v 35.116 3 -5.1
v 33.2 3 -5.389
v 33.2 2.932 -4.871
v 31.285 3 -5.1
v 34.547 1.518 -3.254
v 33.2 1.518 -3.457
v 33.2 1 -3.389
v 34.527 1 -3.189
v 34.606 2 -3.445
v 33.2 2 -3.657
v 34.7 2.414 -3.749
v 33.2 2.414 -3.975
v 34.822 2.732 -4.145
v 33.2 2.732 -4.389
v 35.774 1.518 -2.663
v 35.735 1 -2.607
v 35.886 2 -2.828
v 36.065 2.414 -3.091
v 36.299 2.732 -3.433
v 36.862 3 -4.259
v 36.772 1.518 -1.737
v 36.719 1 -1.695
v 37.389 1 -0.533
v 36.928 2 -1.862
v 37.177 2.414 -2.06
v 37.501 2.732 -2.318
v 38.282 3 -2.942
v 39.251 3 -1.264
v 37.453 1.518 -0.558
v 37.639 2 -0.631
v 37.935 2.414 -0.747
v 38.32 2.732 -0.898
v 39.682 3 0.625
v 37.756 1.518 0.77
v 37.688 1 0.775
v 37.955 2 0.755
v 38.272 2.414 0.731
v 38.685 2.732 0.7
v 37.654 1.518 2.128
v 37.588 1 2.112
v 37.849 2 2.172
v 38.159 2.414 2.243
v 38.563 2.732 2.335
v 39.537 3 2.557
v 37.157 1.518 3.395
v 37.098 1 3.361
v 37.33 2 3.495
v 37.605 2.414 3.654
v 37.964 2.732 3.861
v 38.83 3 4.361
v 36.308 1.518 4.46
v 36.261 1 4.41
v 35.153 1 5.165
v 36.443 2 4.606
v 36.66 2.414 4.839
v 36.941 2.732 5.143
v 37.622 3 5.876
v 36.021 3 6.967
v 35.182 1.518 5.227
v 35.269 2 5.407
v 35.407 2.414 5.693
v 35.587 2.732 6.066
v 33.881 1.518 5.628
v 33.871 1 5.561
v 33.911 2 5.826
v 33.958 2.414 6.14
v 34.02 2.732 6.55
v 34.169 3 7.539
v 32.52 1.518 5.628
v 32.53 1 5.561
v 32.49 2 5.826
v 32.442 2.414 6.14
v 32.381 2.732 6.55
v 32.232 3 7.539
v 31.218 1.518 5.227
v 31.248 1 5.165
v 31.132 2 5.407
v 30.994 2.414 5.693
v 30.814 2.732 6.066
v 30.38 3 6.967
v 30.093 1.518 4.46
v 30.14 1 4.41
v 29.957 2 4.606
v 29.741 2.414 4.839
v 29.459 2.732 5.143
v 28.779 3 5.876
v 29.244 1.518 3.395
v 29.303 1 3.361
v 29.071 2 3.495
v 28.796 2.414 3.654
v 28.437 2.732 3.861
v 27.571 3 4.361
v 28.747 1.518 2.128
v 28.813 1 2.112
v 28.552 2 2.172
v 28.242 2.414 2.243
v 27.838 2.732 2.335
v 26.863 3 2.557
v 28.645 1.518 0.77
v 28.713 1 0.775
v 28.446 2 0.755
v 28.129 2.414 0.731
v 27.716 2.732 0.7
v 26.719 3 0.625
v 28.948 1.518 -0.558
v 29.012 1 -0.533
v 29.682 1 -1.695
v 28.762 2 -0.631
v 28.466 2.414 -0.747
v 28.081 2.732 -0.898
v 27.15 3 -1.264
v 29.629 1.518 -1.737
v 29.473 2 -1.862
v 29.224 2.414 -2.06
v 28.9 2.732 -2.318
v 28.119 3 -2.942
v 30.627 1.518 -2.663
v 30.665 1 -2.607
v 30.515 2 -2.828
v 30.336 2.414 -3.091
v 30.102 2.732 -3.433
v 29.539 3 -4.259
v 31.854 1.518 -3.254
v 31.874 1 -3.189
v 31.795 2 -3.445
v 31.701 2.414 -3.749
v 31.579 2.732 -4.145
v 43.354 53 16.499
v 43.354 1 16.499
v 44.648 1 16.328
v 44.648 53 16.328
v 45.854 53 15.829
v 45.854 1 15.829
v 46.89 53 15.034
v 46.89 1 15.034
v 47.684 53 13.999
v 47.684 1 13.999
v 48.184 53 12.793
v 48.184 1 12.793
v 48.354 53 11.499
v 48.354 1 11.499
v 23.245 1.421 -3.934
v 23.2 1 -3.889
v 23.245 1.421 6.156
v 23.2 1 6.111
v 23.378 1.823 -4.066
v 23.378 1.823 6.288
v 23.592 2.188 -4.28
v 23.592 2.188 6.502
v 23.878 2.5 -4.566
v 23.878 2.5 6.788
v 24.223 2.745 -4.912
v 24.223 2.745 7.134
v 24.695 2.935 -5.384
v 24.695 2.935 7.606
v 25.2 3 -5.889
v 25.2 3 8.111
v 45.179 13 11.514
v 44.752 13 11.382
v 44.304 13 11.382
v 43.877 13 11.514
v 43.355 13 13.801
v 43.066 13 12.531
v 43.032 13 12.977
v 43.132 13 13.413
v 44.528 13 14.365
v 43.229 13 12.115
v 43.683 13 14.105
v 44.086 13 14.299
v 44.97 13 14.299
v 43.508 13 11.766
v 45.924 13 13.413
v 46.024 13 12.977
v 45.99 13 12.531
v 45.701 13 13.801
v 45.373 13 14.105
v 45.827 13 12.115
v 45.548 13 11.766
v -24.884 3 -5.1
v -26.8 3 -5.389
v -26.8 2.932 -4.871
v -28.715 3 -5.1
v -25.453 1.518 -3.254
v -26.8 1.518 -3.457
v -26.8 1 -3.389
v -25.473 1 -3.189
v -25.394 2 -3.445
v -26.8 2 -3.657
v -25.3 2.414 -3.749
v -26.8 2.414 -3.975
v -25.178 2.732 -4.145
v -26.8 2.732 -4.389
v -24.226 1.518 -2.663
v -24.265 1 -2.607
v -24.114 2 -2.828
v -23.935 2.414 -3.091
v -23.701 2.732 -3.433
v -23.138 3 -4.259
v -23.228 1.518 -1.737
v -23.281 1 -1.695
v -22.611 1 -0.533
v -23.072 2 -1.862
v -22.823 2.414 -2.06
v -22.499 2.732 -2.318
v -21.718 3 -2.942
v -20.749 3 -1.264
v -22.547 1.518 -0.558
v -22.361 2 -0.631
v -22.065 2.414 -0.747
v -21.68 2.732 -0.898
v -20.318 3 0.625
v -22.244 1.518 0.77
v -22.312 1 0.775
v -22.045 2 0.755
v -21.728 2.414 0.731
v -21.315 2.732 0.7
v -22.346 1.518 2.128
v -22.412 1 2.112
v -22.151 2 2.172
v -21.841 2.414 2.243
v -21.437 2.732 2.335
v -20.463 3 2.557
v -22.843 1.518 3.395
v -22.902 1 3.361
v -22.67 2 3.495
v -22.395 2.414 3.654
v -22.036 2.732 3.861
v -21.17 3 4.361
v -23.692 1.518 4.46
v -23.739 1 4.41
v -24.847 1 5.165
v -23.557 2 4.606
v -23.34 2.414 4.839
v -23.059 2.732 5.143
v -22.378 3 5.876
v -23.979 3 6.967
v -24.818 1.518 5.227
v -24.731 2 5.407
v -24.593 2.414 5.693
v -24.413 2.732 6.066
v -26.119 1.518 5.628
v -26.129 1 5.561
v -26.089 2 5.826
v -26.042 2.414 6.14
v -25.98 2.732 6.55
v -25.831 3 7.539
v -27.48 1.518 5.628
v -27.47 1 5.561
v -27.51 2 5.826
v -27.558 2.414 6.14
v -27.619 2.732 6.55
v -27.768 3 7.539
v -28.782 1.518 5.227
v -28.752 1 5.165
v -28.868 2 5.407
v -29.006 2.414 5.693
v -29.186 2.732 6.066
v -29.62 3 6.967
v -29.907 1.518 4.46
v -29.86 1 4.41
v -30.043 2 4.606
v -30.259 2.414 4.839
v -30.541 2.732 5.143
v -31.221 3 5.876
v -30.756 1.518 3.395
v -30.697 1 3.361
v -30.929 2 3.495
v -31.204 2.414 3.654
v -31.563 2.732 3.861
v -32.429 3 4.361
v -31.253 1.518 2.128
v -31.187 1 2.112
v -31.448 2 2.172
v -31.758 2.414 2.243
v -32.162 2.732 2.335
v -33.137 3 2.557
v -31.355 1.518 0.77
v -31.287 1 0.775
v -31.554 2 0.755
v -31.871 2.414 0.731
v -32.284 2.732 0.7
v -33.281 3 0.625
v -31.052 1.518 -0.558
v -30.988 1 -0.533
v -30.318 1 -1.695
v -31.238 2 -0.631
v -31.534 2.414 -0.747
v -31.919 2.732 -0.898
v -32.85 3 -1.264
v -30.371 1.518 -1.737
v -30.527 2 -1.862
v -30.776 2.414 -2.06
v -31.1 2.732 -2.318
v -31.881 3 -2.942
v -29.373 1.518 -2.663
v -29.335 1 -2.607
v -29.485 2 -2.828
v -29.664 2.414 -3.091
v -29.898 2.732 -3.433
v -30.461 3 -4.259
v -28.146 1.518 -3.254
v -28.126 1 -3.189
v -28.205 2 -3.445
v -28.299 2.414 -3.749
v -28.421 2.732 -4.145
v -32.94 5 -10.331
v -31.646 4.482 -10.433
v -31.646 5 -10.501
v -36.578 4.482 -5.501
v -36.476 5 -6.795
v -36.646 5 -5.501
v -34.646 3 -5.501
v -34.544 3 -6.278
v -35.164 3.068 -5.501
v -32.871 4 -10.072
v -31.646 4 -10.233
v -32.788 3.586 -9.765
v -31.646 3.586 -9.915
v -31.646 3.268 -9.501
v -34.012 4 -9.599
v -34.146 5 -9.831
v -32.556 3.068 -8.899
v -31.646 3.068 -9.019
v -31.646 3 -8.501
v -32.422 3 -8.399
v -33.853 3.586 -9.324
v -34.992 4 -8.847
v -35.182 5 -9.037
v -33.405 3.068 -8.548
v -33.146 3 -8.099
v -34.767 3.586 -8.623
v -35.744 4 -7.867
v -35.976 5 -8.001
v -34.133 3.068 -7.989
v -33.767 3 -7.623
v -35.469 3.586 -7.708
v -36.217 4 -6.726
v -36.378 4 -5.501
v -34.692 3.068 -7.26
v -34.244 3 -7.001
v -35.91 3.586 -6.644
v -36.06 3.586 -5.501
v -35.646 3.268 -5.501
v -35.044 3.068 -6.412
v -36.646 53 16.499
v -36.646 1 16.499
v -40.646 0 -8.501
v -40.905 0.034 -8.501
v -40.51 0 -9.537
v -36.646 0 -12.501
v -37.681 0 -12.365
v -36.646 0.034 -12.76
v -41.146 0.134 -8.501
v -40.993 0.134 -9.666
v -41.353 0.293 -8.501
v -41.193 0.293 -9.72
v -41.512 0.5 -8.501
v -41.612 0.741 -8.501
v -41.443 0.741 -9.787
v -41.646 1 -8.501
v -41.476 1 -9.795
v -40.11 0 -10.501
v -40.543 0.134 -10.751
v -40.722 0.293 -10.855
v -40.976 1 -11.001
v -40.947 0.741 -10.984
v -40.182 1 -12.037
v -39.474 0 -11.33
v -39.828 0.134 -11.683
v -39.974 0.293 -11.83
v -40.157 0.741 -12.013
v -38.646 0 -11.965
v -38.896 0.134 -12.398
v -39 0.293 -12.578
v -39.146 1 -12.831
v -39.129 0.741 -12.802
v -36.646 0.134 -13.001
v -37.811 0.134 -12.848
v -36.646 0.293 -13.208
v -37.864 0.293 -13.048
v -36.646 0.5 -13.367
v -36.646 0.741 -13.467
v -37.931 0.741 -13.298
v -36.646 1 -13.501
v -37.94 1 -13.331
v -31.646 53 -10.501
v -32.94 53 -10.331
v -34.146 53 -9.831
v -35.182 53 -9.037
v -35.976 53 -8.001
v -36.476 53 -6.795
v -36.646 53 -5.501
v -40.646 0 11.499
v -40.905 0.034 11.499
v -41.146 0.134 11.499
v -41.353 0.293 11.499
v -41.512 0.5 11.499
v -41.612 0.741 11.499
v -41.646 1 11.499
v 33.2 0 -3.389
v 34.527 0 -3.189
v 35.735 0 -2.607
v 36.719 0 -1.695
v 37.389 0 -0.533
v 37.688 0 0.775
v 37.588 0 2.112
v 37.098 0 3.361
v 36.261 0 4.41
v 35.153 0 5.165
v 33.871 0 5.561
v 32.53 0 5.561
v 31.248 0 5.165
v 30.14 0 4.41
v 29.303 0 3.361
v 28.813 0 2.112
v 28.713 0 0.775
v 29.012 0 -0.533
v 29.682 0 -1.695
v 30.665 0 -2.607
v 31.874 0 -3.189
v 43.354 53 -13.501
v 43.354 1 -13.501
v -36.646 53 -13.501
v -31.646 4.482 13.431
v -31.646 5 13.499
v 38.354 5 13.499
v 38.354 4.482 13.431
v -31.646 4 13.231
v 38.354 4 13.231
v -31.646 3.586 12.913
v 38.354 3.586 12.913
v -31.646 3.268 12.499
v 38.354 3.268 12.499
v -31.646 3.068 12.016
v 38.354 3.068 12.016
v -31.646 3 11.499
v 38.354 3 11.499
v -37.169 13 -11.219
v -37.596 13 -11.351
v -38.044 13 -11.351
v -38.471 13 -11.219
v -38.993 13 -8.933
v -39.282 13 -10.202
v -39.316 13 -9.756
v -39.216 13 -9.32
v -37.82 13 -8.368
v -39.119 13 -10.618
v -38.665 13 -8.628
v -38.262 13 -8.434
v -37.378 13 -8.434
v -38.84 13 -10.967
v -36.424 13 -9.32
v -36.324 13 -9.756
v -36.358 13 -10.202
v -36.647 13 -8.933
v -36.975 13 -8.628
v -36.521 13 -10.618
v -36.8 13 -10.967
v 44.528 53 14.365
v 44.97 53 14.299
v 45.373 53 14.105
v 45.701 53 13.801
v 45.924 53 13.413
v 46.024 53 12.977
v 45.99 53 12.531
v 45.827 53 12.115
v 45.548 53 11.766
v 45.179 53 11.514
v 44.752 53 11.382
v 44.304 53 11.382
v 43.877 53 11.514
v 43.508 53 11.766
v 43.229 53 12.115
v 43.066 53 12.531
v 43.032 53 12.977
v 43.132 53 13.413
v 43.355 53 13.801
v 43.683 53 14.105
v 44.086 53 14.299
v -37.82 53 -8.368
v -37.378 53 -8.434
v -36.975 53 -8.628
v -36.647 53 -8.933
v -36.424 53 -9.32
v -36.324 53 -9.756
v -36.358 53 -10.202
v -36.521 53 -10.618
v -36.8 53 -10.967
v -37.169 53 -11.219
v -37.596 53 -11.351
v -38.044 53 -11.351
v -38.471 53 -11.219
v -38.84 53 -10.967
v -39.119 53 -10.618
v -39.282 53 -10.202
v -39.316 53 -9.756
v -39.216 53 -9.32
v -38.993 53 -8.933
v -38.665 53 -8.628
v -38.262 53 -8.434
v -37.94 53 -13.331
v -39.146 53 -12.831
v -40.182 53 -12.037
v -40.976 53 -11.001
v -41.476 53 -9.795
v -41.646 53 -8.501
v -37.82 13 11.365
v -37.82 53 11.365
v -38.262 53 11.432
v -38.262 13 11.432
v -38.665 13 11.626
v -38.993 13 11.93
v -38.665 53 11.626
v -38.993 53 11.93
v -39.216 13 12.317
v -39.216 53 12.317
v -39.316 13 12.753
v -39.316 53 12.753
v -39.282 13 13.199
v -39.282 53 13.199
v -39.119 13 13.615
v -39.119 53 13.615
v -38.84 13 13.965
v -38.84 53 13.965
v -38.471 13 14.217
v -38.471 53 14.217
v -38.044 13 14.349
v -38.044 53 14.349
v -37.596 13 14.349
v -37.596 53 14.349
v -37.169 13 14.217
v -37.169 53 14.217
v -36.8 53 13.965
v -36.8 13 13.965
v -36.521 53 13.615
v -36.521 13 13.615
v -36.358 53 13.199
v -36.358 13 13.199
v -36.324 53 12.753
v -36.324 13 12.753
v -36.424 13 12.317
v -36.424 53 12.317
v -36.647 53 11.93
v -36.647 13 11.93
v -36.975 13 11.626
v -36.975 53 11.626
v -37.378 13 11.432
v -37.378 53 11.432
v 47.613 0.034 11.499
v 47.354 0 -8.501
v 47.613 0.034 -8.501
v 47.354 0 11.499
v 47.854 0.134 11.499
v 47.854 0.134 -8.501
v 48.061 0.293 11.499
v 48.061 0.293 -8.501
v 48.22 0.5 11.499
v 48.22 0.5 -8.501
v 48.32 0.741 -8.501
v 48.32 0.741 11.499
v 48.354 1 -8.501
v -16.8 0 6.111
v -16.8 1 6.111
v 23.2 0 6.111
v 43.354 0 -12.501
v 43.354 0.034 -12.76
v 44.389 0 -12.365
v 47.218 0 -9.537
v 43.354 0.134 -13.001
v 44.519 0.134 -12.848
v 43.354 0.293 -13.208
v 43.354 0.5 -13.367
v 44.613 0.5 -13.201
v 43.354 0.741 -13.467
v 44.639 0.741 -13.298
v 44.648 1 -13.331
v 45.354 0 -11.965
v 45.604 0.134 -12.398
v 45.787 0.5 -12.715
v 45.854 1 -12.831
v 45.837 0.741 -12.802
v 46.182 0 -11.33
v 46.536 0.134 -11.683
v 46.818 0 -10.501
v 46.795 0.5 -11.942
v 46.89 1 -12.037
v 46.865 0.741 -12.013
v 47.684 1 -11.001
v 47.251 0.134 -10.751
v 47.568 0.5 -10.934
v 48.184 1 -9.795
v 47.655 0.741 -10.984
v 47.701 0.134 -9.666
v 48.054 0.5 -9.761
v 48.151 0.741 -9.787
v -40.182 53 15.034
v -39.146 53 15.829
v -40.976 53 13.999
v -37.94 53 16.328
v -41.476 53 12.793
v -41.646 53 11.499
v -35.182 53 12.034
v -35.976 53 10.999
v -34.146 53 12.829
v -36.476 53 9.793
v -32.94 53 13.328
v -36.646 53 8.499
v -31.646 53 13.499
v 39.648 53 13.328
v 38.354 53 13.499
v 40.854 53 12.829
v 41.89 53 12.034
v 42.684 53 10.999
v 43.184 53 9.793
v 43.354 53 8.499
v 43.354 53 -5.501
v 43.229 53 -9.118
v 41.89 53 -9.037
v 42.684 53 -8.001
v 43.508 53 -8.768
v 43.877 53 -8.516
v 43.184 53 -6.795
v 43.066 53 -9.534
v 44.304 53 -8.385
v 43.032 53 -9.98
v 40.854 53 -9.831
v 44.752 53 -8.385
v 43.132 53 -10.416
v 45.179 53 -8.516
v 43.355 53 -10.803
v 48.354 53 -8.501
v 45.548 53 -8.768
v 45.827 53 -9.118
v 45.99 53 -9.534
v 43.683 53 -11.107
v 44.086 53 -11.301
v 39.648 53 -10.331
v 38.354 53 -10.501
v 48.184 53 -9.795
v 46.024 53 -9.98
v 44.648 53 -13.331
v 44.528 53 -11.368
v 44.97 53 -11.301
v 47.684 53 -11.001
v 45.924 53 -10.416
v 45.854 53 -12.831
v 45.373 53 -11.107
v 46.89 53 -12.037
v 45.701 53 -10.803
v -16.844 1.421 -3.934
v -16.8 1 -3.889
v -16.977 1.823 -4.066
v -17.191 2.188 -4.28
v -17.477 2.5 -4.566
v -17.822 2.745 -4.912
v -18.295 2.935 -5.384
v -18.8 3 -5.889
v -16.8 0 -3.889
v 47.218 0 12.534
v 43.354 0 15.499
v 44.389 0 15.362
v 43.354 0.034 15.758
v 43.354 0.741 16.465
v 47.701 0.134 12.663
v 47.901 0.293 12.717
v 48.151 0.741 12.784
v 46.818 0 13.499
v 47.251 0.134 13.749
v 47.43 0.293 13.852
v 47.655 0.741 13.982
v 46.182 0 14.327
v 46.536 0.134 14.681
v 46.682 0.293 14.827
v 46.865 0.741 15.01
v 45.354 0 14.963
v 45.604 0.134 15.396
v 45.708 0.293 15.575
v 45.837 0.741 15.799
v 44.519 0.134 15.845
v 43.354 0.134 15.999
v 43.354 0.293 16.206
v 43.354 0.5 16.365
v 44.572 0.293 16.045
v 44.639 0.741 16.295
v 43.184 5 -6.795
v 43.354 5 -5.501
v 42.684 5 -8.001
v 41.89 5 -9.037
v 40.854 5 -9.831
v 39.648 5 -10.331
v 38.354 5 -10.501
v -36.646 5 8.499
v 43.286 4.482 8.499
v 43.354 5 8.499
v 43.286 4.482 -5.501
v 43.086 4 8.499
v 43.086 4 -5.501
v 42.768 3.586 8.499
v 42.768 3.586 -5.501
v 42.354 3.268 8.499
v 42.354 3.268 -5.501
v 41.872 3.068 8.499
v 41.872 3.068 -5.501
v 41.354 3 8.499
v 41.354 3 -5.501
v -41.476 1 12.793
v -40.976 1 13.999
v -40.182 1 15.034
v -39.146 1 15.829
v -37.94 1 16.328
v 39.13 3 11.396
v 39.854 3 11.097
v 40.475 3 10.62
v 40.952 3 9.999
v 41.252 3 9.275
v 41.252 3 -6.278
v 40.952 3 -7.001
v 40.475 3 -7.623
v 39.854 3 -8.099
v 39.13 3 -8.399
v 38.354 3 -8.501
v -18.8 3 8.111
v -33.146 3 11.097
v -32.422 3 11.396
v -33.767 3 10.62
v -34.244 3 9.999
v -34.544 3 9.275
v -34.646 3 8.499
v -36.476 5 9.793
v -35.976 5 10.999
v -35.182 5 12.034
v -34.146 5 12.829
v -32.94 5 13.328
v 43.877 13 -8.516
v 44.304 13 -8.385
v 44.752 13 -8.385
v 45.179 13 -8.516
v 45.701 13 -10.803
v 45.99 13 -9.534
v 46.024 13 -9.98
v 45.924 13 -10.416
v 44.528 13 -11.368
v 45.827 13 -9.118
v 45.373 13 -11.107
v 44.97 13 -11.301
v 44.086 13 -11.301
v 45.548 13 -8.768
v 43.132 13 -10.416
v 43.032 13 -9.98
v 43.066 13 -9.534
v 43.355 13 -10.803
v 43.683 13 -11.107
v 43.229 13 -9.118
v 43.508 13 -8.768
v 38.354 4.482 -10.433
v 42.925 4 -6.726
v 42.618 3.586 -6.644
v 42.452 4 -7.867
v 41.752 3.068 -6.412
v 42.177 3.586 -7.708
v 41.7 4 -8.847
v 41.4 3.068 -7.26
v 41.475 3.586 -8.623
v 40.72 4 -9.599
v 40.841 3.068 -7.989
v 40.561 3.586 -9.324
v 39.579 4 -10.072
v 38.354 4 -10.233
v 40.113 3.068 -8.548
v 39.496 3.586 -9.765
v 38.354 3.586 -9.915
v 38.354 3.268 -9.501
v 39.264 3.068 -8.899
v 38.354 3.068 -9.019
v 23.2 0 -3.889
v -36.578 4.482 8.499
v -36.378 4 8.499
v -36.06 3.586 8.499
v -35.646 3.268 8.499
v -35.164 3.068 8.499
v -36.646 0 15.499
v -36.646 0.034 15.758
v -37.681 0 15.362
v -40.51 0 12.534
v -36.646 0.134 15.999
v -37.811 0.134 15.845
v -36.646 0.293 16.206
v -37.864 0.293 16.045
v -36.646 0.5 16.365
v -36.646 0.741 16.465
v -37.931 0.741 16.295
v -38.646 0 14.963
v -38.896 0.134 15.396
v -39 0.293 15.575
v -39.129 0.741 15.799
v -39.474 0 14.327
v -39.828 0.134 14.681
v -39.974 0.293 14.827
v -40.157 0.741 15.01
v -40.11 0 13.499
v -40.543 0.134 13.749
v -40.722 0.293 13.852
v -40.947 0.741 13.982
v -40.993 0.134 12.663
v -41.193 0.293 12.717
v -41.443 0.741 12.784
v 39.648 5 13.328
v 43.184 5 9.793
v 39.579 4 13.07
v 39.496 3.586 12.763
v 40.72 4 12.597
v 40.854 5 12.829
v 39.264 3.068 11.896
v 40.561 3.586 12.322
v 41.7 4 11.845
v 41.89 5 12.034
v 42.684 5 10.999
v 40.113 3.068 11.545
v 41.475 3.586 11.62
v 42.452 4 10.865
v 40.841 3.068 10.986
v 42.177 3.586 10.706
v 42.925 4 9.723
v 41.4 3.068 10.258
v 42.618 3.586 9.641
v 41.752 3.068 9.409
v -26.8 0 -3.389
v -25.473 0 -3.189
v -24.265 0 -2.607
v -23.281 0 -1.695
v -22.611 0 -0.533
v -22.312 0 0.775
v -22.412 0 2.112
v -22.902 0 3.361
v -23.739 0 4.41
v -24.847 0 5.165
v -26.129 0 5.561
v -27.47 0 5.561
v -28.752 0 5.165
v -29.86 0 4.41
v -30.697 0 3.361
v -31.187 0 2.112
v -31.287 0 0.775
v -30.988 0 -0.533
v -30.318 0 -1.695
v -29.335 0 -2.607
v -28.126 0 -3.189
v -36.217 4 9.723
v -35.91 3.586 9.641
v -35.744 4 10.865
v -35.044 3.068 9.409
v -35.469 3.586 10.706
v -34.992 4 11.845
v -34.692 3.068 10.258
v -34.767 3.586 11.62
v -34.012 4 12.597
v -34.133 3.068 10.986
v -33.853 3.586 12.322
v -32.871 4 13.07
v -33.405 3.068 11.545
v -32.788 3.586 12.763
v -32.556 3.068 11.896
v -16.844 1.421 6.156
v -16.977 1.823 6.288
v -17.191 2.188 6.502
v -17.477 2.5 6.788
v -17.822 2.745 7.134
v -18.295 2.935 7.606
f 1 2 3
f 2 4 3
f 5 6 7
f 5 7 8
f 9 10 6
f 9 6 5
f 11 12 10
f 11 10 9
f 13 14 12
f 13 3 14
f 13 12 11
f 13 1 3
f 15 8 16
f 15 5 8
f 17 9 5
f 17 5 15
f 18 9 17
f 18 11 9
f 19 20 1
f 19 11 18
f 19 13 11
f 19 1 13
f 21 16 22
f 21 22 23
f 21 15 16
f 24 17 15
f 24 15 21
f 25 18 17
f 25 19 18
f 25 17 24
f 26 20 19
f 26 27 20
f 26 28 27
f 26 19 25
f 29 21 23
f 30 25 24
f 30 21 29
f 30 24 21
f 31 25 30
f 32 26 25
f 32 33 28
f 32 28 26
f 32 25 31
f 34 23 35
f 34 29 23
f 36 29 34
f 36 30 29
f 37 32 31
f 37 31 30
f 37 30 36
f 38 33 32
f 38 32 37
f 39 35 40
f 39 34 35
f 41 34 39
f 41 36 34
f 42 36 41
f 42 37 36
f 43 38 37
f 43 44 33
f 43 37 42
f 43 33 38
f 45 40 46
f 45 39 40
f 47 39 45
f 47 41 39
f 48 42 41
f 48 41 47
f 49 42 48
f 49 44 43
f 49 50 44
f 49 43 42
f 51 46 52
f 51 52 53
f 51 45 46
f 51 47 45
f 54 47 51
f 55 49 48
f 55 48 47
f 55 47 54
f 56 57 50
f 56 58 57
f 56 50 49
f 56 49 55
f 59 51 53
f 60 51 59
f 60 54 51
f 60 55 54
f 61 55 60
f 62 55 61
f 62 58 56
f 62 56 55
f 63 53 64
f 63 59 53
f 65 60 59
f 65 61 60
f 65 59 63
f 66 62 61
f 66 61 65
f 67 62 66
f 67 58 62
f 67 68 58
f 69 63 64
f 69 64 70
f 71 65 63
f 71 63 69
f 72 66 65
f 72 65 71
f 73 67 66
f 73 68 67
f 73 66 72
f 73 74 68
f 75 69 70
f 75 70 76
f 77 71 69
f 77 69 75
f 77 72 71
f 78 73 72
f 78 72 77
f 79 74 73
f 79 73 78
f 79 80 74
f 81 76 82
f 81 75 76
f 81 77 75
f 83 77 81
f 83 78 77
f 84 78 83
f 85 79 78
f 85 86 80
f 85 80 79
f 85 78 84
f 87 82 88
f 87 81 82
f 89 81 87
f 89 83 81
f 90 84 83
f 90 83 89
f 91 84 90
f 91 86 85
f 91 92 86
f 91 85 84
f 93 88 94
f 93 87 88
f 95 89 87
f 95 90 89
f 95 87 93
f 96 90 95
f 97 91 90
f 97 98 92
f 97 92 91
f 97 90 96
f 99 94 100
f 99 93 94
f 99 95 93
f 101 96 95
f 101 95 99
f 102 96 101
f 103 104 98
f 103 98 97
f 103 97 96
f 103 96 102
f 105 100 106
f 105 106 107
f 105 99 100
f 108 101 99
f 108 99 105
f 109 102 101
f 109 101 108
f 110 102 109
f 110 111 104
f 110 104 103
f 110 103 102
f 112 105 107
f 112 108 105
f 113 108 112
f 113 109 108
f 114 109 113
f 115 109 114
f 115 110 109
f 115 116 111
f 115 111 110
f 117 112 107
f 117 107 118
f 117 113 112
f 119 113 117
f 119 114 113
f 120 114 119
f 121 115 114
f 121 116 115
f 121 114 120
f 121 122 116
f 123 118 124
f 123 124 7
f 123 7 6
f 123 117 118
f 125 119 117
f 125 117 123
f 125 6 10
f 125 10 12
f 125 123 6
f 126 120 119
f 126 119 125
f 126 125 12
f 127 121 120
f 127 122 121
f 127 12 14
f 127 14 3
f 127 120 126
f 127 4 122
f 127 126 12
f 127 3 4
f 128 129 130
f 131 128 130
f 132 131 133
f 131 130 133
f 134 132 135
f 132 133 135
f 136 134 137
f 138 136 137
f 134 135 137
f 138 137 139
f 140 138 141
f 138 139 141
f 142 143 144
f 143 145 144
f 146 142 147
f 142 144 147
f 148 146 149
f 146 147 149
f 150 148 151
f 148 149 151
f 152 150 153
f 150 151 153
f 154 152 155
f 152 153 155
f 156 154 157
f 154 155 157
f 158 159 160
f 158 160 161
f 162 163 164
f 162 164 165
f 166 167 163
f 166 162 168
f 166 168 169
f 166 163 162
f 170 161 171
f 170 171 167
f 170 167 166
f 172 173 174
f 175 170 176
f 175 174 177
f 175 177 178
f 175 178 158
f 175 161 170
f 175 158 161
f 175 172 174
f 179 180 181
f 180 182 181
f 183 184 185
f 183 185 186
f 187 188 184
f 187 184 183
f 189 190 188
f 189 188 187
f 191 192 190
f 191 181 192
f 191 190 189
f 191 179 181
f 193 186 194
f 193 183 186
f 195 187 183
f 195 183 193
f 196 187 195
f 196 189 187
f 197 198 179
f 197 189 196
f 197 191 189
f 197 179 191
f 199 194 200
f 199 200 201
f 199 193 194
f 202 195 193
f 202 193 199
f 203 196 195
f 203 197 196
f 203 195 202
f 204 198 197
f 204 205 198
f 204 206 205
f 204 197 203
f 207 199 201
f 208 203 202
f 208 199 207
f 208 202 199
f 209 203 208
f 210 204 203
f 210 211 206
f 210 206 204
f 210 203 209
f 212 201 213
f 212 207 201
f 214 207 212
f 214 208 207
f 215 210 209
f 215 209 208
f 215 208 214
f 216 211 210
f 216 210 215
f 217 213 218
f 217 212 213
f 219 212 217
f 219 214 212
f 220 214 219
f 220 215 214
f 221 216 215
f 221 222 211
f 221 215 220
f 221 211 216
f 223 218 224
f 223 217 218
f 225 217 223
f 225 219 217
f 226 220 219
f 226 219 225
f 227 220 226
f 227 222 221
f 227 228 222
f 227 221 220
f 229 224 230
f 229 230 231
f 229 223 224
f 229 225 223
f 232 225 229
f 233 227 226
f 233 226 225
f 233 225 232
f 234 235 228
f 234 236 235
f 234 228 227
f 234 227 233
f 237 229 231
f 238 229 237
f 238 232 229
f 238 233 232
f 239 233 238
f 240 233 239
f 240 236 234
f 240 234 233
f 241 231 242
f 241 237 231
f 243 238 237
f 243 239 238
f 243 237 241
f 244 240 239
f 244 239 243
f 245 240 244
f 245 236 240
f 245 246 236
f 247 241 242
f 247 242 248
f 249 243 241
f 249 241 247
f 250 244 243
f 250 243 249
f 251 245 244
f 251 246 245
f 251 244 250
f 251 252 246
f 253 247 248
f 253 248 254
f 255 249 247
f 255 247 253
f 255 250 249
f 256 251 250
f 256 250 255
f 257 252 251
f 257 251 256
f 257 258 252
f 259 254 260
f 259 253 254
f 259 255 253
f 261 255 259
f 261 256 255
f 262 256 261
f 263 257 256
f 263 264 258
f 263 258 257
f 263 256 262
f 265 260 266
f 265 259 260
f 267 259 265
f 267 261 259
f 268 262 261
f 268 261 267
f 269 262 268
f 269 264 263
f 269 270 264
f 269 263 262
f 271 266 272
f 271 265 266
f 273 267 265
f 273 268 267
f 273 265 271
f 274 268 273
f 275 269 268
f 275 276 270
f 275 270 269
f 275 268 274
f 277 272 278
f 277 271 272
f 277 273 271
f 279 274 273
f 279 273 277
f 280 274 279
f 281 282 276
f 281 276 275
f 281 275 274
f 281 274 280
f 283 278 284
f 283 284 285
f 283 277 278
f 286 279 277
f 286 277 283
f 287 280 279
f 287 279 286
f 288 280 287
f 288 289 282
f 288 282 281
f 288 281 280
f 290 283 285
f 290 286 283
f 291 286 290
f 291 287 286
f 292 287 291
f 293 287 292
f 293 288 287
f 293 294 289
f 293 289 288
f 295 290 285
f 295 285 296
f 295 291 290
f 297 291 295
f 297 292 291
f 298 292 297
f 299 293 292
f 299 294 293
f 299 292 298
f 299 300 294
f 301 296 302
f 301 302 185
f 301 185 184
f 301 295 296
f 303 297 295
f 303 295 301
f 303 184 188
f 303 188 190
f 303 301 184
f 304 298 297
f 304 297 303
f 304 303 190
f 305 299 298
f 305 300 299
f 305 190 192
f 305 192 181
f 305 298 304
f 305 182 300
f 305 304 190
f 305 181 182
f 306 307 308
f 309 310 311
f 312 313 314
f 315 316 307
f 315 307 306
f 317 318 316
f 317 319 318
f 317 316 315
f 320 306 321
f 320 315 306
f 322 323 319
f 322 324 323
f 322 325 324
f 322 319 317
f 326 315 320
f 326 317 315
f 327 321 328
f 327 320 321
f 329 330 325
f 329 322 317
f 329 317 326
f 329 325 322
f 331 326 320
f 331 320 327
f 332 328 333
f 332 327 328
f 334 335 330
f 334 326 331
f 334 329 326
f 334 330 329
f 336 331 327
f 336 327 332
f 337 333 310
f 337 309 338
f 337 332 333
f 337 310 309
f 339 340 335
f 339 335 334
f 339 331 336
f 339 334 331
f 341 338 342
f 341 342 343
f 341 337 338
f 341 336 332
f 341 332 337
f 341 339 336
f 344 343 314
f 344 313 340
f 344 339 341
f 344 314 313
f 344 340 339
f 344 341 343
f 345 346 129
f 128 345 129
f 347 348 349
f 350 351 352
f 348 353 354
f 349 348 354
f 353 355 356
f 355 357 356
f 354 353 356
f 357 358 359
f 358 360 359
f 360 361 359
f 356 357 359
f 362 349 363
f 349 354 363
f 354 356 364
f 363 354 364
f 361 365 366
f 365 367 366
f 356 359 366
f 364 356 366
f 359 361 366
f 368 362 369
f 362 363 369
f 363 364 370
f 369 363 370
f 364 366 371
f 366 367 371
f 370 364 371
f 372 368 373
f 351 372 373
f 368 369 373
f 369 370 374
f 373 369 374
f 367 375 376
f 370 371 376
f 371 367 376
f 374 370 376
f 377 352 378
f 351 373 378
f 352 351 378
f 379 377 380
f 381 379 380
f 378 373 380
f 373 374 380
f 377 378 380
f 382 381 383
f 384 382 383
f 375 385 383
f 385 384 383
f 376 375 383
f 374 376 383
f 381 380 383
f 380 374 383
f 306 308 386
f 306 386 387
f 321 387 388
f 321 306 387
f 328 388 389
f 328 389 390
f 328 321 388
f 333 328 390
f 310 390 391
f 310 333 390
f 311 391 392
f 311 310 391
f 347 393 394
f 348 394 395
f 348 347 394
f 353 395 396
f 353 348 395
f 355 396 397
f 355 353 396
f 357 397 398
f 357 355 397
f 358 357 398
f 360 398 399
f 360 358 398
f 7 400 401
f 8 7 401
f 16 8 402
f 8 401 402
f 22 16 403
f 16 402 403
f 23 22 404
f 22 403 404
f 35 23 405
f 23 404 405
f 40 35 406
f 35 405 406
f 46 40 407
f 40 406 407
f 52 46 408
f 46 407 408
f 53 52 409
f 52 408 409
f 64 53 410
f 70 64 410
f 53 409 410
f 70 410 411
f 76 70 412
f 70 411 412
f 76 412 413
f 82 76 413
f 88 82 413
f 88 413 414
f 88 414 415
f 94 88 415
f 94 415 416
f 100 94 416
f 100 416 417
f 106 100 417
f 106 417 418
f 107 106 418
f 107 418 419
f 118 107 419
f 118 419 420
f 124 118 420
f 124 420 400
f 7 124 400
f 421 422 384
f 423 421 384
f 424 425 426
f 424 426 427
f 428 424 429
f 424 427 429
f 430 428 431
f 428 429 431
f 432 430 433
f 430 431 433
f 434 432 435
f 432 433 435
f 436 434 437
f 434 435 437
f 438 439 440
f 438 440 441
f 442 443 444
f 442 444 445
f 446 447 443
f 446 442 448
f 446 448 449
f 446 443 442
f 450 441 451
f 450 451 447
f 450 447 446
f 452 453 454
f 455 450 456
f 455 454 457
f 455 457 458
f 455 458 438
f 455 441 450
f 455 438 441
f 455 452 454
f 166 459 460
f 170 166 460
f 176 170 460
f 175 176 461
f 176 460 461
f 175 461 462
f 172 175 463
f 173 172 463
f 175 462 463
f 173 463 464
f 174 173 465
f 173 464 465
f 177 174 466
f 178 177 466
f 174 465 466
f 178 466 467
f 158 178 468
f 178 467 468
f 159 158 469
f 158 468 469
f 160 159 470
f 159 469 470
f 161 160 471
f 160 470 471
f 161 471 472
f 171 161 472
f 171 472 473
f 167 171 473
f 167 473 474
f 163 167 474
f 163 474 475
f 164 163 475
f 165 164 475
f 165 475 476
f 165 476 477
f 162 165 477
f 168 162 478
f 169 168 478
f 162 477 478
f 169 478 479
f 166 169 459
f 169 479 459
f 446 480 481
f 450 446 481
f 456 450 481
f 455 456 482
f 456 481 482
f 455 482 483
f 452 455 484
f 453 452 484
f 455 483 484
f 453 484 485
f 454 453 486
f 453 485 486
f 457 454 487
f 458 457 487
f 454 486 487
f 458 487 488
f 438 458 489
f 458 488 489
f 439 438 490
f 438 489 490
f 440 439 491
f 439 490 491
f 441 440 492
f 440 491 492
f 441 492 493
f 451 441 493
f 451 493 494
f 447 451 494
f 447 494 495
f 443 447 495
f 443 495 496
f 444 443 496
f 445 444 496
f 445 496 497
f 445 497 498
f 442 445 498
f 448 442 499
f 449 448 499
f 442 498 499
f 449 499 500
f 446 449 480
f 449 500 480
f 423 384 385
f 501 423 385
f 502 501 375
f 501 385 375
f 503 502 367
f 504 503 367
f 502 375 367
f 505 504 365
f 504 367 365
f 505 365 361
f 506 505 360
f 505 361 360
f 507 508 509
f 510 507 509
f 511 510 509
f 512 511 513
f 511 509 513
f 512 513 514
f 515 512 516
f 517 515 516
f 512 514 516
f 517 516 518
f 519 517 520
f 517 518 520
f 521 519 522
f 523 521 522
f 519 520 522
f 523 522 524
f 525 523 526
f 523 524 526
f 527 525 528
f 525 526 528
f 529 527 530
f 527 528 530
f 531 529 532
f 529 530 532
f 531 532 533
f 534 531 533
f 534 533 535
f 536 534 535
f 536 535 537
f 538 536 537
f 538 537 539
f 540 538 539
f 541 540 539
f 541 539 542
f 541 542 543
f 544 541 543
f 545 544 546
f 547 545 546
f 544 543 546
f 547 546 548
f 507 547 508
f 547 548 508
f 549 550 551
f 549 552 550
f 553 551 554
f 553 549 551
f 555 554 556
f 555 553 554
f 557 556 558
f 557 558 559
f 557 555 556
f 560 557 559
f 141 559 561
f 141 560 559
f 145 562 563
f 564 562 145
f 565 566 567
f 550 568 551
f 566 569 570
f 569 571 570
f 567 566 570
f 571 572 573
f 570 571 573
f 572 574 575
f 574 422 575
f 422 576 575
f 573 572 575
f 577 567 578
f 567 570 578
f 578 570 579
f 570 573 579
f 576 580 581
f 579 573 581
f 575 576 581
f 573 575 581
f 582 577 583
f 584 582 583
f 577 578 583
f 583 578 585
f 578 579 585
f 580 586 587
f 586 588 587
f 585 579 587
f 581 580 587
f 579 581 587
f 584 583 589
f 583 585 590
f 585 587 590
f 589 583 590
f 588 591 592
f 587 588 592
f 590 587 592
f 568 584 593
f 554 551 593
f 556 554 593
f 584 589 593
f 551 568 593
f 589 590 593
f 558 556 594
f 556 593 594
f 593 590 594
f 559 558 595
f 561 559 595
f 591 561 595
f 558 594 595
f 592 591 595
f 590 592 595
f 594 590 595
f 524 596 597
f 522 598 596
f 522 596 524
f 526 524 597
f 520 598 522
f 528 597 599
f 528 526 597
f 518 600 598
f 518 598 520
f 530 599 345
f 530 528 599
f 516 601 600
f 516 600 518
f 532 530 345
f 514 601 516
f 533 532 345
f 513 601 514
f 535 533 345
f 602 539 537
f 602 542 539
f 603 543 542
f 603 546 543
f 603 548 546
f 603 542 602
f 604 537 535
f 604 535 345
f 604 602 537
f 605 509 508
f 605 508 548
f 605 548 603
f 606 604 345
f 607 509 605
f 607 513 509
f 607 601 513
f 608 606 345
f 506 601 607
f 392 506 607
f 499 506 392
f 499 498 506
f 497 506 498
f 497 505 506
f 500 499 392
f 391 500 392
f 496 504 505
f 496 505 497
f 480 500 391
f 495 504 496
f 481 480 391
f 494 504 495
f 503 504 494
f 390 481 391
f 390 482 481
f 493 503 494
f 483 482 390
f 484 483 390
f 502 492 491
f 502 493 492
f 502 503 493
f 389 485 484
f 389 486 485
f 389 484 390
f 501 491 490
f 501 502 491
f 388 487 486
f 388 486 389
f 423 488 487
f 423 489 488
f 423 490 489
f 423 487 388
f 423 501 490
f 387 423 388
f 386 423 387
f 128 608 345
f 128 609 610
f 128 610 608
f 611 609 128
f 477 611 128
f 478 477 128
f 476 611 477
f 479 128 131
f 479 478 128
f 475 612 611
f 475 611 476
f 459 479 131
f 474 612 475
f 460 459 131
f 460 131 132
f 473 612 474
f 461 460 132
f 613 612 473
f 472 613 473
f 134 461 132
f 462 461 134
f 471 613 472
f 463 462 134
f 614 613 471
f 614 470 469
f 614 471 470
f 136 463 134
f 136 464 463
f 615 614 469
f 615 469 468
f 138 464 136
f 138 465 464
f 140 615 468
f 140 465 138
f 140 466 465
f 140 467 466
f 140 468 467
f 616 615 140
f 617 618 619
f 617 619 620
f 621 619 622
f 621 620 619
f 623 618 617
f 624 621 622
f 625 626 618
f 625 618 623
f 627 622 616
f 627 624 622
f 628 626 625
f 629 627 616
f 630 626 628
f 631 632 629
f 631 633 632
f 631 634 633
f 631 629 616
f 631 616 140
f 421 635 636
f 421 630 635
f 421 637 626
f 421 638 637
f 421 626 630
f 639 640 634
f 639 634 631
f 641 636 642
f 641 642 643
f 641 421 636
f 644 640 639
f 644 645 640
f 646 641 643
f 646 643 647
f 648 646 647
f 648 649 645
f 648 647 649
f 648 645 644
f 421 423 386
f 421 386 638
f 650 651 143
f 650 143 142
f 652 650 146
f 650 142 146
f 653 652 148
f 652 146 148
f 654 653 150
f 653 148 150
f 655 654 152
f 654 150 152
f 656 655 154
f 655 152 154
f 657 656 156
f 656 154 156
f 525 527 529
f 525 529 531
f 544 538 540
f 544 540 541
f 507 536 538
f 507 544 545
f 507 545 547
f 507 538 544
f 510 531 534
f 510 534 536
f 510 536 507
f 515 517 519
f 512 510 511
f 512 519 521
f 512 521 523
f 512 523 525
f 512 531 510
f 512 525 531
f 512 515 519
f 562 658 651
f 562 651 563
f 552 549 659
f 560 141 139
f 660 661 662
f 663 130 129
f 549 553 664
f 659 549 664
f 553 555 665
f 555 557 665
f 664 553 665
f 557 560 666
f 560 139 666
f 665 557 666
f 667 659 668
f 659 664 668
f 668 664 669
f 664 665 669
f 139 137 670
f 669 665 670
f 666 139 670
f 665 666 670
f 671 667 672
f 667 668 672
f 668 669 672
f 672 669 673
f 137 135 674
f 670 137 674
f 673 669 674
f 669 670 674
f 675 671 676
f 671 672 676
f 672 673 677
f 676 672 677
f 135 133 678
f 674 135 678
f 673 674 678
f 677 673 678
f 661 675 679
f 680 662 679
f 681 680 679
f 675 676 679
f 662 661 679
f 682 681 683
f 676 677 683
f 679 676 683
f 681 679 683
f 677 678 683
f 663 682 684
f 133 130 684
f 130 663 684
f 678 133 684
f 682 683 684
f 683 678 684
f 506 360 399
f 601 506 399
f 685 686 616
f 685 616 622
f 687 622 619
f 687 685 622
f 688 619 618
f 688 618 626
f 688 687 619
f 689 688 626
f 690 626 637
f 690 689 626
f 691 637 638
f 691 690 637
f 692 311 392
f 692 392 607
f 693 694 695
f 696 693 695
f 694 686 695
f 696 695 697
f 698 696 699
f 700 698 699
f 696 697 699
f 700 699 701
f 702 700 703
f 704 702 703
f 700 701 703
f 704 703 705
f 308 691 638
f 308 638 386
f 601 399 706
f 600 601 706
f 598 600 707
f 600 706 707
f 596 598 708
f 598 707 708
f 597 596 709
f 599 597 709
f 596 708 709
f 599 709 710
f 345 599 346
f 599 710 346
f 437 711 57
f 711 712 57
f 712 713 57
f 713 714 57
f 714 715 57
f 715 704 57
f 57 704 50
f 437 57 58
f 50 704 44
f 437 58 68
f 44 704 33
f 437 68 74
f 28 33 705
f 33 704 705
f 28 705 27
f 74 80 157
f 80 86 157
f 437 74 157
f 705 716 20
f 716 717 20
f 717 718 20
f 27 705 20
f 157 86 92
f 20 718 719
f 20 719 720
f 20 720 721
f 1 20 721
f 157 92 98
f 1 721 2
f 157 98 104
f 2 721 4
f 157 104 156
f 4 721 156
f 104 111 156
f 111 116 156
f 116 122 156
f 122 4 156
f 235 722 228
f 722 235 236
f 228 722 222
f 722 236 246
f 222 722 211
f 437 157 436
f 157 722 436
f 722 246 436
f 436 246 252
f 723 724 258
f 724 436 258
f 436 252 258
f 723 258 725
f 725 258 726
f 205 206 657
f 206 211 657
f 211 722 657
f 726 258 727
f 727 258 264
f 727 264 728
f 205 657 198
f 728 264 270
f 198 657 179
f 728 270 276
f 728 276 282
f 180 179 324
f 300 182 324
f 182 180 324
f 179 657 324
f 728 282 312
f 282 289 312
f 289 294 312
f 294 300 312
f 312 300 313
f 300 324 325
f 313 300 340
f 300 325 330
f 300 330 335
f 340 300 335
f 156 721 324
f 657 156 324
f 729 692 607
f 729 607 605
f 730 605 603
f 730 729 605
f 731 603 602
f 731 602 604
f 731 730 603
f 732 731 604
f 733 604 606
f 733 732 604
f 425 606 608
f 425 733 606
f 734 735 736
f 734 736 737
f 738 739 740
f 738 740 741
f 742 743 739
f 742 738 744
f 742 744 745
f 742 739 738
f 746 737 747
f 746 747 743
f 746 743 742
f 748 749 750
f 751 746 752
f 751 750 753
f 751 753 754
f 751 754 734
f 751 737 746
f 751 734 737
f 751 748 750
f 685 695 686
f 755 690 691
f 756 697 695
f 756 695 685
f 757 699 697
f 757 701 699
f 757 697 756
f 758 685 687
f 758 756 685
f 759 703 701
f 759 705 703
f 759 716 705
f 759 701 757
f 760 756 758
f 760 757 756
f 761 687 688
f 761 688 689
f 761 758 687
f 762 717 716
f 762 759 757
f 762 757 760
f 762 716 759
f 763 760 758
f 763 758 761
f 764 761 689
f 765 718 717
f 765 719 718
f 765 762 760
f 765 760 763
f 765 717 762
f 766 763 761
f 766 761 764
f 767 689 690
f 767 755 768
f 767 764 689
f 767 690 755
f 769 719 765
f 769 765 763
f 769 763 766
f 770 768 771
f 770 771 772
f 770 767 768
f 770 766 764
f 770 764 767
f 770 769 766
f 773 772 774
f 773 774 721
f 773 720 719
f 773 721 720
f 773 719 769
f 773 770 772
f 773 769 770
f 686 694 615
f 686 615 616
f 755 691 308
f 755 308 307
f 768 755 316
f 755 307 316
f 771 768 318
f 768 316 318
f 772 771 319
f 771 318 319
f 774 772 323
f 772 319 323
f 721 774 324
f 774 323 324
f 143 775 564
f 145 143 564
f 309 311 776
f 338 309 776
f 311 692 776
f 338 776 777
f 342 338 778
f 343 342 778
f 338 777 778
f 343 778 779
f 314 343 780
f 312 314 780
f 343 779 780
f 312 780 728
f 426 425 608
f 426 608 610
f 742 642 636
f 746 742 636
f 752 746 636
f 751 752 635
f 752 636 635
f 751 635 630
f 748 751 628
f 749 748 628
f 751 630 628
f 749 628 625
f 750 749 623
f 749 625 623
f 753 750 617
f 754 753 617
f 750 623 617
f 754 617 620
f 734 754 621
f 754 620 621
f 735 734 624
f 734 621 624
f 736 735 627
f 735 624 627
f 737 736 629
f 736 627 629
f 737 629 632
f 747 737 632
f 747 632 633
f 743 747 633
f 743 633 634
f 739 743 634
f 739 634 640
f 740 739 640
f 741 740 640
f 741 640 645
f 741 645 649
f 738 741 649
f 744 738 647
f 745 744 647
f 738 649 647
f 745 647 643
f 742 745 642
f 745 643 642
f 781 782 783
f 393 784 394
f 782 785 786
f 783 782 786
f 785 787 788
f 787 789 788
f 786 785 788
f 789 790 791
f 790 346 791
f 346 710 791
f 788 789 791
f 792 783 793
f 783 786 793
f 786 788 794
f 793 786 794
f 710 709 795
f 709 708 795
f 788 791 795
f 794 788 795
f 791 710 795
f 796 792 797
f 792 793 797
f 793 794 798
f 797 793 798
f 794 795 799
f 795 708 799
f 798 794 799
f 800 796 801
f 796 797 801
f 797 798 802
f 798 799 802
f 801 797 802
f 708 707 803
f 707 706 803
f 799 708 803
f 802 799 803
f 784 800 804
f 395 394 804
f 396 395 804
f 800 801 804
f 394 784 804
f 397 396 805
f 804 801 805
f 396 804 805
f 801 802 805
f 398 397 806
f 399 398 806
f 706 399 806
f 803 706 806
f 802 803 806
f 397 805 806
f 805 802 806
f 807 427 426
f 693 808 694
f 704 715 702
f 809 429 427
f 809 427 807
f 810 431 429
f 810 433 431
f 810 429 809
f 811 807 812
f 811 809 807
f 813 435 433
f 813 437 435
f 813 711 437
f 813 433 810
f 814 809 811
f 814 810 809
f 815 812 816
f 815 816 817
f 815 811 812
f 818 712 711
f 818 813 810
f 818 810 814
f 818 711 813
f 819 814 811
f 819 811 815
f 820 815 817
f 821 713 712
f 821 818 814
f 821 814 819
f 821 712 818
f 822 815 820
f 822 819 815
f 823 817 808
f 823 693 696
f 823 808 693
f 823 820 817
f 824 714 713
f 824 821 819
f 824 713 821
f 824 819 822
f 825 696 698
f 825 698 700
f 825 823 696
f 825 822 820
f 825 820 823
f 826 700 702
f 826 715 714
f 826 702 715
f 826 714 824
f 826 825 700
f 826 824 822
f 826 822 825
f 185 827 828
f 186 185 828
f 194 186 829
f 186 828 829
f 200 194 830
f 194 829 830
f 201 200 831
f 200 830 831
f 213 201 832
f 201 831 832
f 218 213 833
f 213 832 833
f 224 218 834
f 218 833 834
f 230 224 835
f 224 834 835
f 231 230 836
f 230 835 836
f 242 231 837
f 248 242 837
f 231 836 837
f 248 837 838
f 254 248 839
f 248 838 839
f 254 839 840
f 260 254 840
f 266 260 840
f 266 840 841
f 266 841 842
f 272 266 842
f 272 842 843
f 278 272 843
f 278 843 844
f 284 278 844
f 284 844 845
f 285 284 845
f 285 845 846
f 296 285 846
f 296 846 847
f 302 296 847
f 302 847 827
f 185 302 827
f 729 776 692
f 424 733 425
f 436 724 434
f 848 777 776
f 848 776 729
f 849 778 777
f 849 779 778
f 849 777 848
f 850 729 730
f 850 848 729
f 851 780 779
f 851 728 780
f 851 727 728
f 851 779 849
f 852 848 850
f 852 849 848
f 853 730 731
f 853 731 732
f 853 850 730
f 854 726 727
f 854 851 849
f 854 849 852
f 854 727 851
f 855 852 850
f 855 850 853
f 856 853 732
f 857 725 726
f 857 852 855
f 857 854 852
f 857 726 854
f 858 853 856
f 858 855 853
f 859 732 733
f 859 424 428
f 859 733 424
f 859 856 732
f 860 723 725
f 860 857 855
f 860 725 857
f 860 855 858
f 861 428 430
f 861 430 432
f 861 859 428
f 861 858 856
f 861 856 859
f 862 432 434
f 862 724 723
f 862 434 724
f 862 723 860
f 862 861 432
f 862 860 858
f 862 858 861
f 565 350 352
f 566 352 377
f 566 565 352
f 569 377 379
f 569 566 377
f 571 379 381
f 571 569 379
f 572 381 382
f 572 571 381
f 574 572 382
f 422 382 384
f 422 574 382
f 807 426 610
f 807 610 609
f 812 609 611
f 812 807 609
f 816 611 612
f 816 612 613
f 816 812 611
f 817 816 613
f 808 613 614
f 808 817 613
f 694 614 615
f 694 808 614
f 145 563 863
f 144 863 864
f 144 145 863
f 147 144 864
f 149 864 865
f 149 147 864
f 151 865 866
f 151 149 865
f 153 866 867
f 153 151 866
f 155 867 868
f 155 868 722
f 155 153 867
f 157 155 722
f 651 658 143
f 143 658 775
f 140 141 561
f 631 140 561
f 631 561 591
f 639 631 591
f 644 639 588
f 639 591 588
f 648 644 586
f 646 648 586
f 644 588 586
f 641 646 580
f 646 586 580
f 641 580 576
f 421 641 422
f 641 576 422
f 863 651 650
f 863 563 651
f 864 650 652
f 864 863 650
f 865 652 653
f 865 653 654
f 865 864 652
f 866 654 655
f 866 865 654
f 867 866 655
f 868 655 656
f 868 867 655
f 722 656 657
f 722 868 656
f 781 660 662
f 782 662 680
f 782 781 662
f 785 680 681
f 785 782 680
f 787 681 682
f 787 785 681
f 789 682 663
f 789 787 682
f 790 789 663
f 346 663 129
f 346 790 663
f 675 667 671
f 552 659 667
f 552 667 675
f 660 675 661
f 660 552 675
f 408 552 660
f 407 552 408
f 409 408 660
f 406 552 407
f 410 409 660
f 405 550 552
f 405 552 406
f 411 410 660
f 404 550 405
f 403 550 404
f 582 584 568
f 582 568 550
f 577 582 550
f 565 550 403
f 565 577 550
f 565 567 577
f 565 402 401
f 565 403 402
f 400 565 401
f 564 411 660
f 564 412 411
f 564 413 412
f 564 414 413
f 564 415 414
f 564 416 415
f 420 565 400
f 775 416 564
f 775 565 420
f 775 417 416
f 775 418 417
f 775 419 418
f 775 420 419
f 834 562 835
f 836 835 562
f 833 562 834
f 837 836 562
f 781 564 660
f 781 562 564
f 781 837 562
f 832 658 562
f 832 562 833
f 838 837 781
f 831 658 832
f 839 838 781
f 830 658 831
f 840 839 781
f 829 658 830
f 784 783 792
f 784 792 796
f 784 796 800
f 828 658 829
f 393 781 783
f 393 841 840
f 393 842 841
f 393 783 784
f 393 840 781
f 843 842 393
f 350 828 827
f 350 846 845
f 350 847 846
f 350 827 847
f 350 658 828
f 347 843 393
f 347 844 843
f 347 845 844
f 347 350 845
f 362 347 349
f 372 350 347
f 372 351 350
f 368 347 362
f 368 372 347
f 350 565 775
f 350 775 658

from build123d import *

# Parameters (mm, degrees)
BOSS_EXTRUDE2_DEPTH = 3
BOSS_EXTRUDE3_DEPTH = 50
FILLET3_R           = 1
SKETCH4_R           = 1.5
CUT_EXTRUDE1_DEPTH  = 40
SKETCH5_R           = 4.5
SKETCH5_W           = 40
SKETCH5_H           = 10
CUT_EXTRUDE2_DEPTH  = 10
FILLET4_R           = 2


with BuildPart() as part:
    # Sketch1 → Boss-Extrude2 (new body)
    with BuildSketch(Plane(origin=(0, 0, 0), x_dir=(1, 0, 0), z_dir=(0, 1, 0))):
        with BuildLine():
            Line((-36.64598461, 13.50127958), (43.35401539, 13.50127958))
            ThreePointArc((43.35401539, 13.50127958), (46.889549296, 12.036813486), (48.35401539, 8.50127958))
            Line((48.35401539, 8.50127958), (48.35401539, -11.49872042))
            ThreePointArc((48.35401539, -11.49872042), (46.889549296, -15.034254326), (43.35401539, -16.49872042))
            Line((43.35401539, -16.49872042), (-36.64598461, -16.49872042))
            ThreePointArc((-36.64598461, -16.49872042), (-40.181518516, -15.034254326), (-41.64598461, -11.49872042))
            Line((-41.64598461, -11.49872042), (-41.64598461, 8.50127958))
            ThreePointArc((-41.64598461, 8.50127958), (-40.181518516, 12.036813486), (-36.64598461, 13.50127958))
        make_face()
    extrude(amount=BOSS_EXTRUDE2_DEPTH)

    # Sketch3 → Boss-Extrude3 (add)
    with BuildSketch(Plane(origin=(0, 3, 0), x_dir=(1, 0, 0), z_dir=(0, 1, 0))):
        with BuildLine():
            Line((-36.64598461, -16.49872042), (43.35401539, -16.49872042))
            ThreePointArc((43.35401539, -16.49872042), (46.889549296, -15.034254326), (48.35401539, -11.49872042))
            Line((48.35401539, -11.49872042), (48.35401539, 8.50127958))
            ThreePointArc((48.35401539, 8.50127958), (46.889549296, 12.036813486), (43.35401539, 13.50127958))
            Line((43.35401539, 13.50127958), (-36.64598461, 13.50127958))
            ThreePointArc((-36.64598461, 13.50127958), (-40.181518516, 12.036813486), (-41.64598461, 8.50127958))
            Line((-41.64598461, 8.50127958), (-41.64598461, -11.49872042))
            ThreePointArc((-41.64598461, -11.49872042), (-40.181518516, -15.034254326), (-36.64598461, -16.49872042))
        make_face()
        with BuildLine():
            Line((-36.64598461, 5.50127958), (-36.64598461, -8.49872042))
            ThreePointArc((-36.64598461, -8.49872042), (-35.181518516, -12.034254326), (-31.64598461, -13.49872042))
            Line((-31.64598461, -13.49872042), (38.35401539, -13.49872042))
            ThreePointArc((38.35401539, -13.49872042), (41.889549296, -12.034254326), (43.35401539, -8.49872042))
            Line((43.35401539, -8.49872042), (43.35401539, 5.50127958))
            ThreePointArc((43.35401539, 5.50127958), (41.889549296, 9.036813486), (38.35401539, 10.50127958))
            Line((38.35401539, 10.50127958), (-31.64598461, 10.50127958))
            ThreePointArc((-31.64598461, 10.50127958), (-35.181518516, 9.036813486), (-36.64598461, 5.50127958))
        make_face(mode=Mode.SUBTRACT)
    extrude(amount=BOSS_EXTRUDE3_DEPTH)

    # Fillet3
    fillet3_edges = [part.edges().sort_by_distance(p)[0] for p in [
        (3.35401539, 0, 16.49872042),
        (46.889549296, 0, 15.034254326),
        (48.35401539, 0, 1.49872042),
        (46.889549296, 0, -12.036813486),
        (3.35401539, 0, -13.50127958),
        (-40.181518516, 0, -12.036813486),
        (-41.64598461, 0, 1.49872042),
        (-40.181518516, 0, 15.034254326),
    ]]
    fillet(fillet3_edges, radius=FILLET3_R)

    # Sketch4 → Cut-Extrude1 (cut)
    with BuildSketch(Plane(origin=(0, 53, 0), x_dir=(1, 0, 0), z_dir=(0, 1, 0))):
        with Locations((-37.819946043, 9.867837779)):
            Circle(SKETCH4_R)
        with Locations((-37.819946043, -12.865278618)):
            Circle(SKETCH4_R)
        with Locations((44.527976823, -12.865278618)):
            Circle(SKETCH4_R)
        with Locations((44.527976823, 9.867837779)):
            Circle(SKETCH4_R)
    extrude(amount=-CUT_EXTRUDE1_DEPTH, mode=Mode.SUBTRACT)

    # Sketch5 → Cut-Extrude2 (cut)
    with BuildSketch(Plane.XZ):
        with Locations((33.20043836, 1.111101434)):
            Circle(SKETCH5_R)
        with Locations((-26.79956164, 1.111101434)):
            Circle(SKETCH5_R)
        with Locations((3.20043836, 1.111101434)):
            Rectangle(SKETCH5_W, SKETCH5_H)
    extrude(amount=-CUT_EXTRUDE2_DEPTH, mode=Mode.SUBTRACT)

    # Fillet4
    fillet4_edges = [part.edges().sort_by_distance(p)[0] for p in [
        (43.35401539, 3, 1.49872042),
        (41.889549296, 3, 12.034254326),
        (3.35401539, 3, 13.49872042),
        (-35.181518516, 3, 12.034254326),
        (-36.64598461, 3, 1.49872042),
        (-35.181518516, 3, -9.036813486),
        (3.35401539, 3, -10.50127958),
        (41.889549296, 3, -9.036813486),
        (3.20043836, 3, -3.888898566),
        (-16.79956164, 3, 1.111101434),
        (3.20043836, 3, 6.111101434),
        (23.20043836, 3, 1.111101434),
        (28.70043836, 3, 1.111101434),
        (-31.29956164, 3, 1.111101434),
    ]]
    fillet(fillet4_edges, radius=FILLET4_R)


solid = part.part
